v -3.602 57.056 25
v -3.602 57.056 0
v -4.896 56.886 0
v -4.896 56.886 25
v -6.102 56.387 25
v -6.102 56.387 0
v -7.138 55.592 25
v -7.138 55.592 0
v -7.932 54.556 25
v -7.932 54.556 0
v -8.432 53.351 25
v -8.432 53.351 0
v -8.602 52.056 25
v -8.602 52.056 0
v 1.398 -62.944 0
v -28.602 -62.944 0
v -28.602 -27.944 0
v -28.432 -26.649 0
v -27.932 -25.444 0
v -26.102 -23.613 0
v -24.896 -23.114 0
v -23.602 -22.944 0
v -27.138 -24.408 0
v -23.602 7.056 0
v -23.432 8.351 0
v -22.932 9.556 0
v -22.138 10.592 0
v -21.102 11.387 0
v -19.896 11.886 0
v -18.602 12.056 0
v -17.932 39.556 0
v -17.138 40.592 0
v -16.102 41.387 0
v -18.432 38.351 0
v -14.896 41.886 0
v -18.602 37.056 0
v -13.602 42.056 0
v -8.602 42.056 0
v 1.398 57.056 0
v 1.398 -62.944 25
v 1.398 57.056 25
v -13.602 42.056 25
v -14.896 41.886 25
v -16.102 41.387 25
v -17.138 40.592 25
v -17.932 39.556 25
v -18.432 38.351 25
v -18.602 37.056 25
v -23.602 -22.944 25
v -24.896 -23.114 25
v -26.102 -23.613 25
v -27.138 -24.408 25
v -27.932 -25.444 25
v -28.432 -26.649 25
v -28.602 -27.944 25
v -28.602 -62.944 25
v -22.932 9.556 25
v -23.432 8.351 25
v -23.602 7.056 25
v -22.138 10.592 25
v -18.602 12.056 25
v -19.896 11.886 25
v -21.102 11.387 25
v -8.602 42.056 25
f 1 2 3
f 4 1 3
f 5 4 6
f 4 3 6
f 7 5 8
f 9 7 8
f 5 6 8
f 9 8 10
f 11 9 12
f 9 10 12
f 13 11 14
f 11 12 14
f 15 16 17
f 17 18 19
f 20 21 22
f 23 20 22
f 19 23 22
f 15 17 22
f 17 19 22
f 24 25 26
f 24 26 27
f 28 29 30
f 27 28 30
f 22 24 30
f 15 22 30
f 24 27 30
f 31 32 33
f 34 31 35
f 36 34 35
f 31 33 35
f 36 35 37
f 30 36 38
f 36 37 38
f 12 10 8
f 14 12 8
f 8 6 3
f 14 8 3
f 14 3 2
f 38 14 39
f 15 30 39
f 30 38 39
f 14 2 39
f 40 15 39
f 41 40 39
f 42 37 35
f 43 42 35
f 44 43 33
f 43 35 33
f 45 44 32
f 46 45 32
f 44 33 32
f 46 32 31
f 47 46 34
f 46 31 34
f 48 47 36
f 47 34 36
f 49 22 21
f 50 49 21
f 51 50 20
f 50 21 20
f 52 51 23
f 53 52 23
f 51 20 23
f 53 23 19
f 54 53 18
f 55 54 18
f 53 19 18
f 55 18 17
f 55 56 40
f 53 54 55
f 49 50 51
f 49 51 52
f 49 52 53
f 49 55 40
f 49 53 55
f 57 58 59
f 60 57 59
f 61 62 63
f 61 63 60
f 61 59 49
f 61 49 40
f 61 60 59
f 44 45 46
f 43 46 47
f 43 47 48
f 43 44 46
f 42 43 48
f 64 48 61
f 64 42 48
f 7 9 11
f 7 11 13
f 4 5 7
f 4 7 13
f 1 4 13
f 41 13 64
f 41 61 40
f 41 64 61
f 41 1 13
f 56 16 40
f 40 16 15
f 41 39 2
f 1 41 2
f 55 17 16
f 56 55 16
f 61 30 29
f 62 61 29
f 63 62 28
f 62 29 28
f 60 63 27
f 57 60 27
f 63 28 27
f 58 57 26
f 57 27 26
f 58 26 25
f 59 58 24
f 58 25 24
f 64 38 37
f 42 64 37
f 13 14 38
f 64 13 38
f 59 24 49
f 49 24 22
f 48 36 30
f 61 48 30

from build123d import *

# Parameters (mm, degrees)
F1_DEPTH = 25


with BuildPart() as f1:
    # F0 (on Top) → F1 (new body)
    with BuildSketch(Plane.XY):
        with BuildLine():
            Line((-28.602151, -27.943548), (-28.602151, -62.943548))
            Line((-28.602151, -62.943548), (1.397849, -62.943548))
            Line((1.397849, -62.943548), (1.397849, 57.056452))
            Line((1.397849, 57.056452), (-3.602151, 57.056452))
            ThreePointArc((-3.602151, 57.056452), (-7.137685, 55.591986), (-8.602151, 52.056452))
            Line((-8.602151, 52.056452), (-8.602151, 42.056452))
            Line((-8.602151, 42.056452), (-13.602151, 42.056452))
            ThreePointArc((-13.602151, 42.056452), (-17.137685, 40.591986), (-18.602151, 37.056452))
            Line((-18.602151, 37.056452), (-18.602151, 12.056452))
            ThreePointArc((-18.602151, 12.056452), (-22.137685, 10.591986), (-23.602151, 7.056452))
            Line((-23.602151, 7.056452), (-23.602151, -22.943548))
            ThreePointArc((-23.602151, -22.943548), (-27.137685, -24.408014), (-28.602151, -27.943548))
        make_face()
    extrude(amount=F1_DEPTH)


solid = f1.part
